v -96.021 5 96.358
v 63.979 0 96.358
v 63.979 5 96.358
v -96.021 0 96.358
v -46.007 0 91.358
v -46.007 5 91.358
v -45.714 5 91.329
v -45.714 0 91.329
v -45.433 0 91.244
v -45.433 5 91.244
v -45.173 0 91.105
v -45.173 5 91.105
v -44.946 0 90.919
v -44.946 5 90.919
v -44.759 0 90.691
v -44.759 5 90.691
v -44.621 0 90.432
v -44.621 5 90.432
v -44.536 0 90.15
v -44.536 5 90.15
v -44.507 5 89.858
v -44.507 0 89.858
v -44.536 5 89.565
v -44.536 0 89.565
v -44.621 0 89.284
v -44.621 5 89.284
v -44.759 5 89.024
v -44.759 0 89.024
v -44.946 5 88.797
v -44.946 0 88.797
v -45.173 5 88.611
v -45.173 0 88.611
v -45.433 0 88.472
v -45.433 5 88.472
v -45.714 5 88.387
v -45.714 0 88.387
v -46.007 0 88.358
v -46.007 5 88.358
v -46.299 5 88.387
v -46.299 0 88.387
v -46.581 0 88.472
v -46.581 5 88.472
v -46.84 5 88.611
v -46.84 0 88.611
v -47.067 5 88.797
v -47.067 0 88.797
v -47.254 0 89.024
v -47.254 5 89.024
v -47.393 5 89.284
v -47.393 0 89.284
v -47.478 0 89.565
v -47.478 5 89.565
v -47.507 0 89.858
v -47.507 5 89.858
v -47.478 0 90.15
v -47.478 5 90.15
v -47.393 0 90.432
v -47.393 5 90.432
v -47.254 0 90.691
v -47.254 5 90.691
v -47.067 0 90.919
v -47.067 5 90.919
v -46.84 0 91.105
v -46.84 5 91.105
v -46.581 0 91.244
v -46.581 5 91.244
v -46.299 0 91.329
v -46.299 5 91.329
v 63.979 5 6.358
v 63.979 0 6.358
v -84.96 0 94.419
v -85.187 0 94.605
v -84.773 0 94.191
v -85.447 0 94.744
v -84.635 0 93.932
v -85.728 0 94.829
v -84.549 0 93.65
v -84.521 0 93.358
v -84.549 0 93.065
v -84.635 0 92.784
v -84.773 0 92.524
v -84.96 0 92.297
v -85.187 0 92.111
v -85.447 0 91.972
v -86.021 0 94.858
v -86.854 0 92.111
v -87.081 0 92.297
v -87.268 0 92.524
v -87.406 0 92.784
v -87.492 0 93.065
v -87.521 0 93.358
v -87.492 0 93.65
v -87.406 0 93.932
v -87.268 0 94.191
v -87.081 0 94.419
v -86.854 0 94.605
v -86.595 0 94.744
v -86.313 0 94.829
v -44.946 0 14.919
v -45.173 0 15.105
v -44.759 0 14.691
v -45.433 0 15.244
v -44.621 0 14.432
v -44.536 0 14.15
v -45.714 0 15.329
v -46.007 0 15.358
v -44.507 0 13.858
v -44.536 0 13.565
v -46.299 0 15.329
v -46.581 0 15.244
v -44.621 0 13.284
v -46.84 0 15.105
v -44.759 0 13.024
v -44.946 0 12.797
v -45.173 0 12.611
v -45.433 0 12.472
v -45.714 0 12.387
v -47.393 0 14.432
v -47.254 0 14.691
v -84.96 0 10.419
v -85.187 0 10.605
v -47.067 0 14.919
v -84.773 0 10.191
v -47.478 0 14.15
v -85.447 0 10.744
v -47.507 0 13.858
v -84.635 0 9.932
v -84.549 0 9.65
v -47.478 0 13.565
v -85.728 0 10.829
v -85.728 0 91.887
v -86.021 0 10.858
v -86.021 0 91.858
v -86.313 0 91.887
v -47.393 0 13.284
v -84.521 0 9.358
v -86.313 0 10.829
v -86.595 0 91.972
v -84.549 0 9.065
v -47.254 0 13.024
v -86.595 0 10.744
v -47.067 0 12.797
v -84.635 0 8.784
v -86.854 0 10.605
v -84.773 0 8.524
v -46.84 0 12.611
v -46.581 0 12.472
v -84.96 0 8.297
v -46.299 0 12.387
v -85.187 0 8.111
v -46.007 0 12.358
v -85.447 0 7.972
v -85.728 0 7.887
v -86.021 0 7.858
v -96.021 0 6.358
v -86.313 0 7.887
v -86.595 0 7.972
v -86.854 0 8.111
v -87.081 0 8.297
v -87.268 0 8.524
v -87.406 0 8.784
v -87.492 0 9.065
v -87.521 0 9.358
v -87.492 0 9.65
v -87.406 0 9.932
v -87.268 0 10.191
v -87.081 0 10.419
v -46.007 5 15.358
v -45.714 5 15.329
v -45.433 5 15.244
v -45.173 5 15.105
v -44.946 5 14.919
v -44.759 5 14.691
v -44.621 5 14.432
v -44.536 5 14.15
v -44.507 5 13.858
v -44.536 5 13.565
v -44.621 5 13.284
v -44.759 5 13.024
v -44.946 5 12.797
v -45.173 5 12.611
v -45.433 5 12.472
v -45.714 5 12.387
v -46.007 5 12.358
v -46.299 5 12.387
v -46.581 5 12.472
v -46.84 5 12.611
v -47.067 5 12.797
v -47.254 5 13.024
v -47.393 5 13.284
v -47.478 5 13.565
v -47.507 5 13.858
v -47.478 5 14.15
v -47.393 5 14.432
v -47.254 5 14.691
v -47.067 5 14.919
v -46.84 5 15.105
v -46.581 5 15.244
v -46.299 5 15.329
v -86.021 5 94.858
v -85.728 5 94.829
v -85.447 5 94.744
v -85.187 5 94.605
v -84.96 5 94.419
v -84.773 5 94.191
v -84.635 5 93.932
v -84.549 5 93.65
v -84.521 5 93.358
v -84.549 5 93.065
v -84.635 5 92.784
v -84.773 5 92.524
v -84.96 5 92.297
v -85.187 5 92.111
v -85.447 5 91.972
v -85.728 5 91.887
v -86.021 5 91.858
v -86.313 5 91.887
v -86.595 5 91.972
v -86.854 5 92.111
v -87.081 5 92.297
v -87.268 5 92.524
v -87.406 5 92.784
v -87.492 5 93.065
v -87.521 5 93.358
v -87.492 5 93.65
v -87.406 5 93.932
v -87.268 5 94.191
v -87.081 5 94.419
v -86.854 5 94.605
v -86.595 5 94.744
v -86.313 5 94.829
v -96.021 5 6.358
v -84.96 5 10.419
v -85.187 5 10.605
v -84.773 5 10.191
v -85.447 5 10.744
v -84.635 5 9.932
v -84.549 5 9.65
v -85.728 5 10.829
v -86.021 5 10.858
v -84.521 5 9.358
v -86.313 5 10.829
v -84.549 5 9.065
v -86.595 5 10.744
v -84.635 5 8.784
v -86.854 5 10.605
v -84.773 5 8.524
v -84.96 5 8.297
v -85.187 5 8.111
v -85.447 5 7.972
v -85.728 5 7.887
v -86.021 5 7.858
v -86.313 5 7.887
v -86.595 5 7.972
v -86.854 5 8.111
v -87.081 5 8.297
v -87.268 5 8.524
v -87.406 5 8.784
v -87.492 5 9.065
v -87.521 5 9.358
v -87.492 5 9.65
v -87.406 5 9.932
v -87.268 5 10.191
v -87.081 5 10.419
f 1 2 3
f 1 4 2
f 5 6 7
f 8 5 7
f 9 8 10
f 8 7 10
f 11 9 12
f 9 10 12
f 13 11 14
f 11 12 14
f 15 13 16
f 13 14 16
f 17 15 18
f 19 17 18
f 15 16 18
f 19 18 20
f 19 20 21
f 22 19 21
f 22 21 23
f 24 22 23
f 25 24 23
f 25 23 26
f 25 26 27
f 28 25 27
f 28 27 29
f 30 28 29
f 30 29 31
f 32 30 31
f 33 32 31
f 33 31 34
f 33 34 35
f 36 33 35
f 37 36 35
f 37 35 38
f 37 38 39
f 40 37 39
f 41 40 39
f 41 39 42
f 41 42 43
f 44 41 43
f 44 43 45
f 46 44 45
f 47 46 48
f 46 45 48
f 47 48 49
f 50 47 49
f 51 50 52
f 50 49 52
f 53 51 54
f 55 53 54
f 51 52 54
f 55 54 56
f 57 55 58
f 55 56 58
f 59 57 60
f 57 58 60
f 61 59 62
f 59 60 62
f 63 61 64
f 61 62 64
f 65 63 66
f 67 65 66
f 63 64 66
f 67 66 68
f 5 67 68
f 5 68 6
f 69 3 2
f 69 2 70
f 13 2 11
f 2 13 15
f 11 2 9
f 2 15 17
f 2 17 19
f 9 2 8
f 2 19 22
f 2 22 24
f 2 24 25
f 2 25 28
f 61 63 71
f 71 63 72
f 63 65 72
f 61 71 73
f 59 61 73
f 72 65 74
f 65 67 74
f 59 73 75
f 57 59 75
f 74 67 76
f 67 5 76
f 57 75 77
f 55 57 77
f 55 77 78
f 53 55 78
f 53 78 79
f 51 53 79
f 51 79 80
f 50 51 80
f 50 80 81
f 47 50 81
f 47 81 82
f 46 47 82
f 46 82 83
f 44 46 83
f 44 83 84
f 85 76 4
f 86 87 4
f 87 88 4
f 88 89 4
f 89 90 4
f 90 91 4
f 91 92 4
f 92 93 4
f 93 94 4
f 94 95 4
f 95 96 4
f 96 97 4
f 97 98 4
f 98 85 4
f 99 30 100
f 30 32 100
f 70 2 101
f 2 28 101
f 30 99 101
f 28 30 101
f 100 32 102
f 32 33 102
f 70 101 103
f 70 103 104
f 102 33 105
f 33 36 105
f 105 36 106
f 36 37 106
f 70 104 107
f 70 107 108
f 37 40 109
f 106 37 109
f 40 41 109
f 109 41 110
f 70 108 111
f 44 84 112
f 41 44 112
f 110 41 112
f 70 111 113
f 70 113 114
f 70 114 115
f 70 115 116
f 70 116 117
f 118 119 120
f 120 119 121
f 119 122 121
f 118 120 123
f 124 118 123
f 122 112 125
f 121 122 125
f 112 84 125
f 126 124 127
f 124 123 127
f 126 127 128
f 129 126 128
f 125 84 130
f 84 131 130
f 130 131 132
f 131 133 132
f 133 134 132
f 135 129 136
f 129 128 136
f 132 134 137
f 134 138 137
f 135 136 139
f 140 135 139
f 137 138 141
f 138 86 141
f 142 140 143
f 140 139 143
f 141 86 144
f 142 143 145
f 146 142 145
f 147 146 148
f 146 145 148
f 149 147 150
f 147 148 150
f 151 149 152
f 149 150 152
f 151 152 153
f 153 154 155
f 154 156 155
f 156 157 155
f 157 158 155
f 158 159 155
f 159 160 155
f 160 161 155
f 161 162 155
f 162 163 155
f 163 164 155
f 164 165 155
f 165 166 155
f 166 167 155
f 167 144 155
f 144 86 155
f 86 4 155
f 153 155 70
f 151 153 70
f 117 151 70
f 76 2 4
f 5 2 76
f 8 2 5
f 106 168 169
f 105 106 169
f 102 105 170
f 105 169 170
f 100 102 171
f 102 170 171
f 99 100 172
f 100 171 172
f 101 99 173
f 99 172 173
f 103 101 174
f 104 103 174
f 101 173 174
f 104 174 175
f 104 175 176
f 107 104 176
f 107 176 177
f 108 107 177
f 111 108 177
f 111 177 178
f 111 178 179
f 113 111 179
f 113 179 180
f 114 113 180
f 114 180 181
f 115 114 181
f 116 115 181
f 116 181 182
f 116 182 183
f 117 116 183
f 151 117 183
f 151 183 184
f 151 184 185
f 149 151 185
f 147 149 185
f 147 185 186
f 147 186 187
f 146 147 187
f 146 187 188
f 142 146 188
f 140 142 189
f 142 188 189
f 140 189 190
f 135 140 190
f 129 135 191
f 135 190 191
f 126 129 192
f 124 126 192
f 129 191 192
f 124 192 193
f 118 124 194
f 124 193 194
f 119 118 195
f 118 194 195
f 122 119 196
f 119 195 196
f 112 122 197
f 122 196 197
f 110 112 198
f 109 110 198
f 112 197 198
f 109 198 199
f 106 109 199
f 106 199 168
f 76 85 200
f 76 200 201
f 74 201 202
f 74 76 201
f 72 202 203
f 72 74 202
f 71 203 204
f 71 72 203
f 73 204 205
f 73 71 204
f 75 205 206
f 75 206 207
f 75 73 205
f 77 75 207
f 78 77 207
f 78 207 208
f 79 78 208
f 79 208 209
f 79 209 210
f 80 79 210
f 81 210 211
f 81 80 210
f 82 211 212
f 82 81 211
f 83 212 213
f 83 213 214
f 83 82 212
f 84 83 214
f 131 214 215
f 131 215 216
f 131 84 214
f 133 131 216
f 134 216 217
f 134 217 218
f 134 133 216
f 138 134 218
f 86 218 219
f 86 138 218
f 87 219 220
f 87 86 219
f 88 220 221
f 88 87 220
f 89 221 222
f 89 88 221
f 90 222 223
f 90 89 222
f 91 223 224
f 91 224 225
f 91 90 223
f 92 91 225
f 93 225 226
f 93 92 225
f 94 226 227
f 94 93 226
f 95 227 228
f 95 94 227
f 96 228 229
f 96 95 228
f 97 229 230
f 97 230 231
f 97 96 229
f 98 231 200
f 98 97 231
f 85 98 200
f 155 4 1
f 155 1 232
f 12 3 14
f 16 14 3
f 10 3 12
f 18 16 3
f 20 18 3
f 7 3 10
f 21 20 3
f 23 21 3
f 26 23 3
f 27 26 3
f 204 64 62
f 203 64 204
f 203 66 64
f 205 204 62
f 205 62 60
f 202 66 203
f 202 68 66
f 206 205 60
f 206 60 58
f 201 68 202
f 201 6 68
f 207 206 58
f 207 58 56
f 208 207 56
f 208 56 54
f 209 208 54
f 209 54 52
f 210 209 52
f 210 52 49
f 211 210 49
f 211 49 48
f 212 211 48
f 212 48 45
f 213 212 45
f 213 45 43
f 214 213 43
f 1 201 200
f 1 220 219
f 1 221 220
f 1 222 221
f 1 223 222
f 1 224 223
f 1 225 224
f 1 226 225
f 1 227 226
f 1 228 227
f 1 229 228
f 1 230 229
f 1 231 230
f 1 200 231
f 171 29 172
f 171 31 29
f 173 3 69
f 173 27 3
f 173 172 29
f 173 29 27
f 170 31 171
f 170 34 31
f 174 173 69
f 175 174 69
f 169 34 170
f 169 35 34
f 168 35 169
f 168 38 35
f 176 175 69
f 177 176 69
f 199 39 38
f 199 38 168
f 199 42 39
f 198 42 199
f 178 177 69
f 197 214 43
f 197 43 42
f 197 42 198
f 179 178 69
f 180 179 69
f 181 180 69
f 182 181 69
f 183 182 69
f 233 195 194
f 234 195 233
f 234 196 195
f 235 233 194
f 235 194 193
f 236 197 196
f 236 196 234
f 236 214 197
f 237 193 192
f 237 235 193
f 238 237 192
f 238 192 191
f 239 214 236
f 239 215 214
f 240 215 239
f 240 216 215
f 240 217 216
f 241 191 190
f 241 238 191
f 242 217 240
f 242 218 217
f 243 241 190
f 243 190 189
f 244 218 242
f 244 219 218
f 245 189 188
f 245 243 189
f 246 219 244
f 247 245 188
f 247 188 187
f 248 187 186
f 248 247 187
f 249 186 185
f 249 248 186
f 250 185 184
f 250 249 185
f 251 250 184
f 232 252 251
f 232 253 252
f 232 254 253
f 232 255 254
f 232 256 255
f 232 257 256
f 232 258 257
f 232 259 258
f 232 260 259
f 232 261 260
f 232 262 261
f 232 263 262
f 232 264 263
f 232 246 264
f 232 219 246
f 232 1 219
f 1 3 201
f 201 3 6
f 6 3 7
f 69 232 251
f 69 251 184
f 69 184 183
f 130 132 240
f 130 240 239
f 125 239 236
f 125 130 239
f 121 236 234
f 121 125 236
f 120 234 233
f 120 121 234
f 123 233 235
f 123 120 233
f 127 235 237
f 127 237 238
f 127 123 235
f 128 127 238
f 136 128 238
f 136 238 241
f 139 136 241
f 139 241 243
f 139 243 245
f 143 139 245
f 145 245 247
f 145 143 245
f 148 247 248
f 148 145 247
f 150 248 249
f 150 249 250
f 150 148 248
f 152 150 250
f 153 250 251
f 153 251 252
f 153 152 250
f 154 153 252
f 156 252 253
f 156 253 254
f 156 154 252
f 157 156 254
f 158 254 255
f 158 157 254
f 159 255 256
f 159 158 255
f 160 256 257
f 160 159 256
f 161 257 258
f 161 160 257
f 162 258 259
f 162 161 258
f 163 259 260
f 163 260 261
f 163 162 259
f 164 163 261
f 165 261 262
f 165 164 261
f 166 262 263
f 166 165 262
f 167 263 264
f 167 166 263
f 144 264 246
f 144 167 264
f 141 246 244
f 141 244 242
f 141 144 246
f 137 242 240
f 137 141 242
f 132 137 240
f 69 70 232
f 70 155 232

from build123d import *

# Parameters (mm, degrees)
SKETCH1_W           = 200
SKETCH1_H           = 90
SKETCH1_R           = 1.5
BOSS_EXTRUDE1_DEPTH = 5
SKETCH2_W           = 140
SKETCH2_H           = 90
CUT_EXTRUDE1_DEPTH  = 142.850408897
SKETCH3_R           = 1.5
CUT_EXTRUDE2_DEPTH  = 137.124210251
SKETCH4_W           = 90
SKETCH4_H           = 5
BOSS_EXTRUDE2_DEPTH = 100


with BuildPart() as part:
    # Sketch1 → Boss-Extrude1 (new body)
    with BuildSketch(Plane(origin=(0, 0, 0), x_dir=(1, 0, 0), z_dir=(0, 1, 0))):
        with Locations((3.97934472, -51.35784543)):
            Rectangle(SKETCH1_W, SKETCH1_H)
        with Locations(Location((-86.02065528, -9.35784543, 0), (0, 0, 270))):
            Circle(SKETCH1_R, mode=Mode.SUBTRACT)
        with Locations(Location((-86.02065528, -93.35784543, 0), (0, 0, 270))):
            Circle(SKETCH1_R, mode=Mode.SUBTRACT)
        with Locations(Location((93.97934472, -9.35784543, 0), (0, 0, 270))):
            Circle(SKETCH1_R, mode=Mode.SUBTRACT)
        with Locations(Location((93.97934472, -93.35784543, 0), (0, 0, 270))):
            Circle(SKETCH1_R, mode=Mode.SUBTRACT)
    extrude(amount=BOSS_EXTRUDE1_DEPTH)

    # Sketch2 → Cut-Extrude1 (cut, through all)
    with BuildSketch(Plane(origin=(0, 5, 0), x_dir=(1, 0, 0), z_dir=(0, 1, 0))):
        with Locations((33.97934472, -51.35784543)):
            Rectangle(SKETCH2_W, SKETCH2_H)
    extrude(amount=-CUT_EXTRUDE1_DEPTH, mode=Mode.SUBTRACT)

    # Sketch3 → Cut-Extrude2 (cut, through all)
    with BuildSketch(Plane(origin=(0, 5, 0), x_dir=(1, 0, 0), z_dir=(0, 1, 0))):
        with Locations(Location((-46.006691674, -13.85784543, 0), (0, 0, 270))):
            Circle(SKETCH3_R)
        with Locations(Location((-46.006691674, -89.85784543, 0), (0, 0, 270))):
            Circle(SKETCH3_R)
    extrude(amount=-CUT_EXTRUDE2_DEPTH, mode=Mode.SUBTRACT)

    # Sketch4 → Boss-Extrude2 (add)
    with BuildSketch(Plane(origin=(-36.02065528, 0, 0), x_dir=(0, 0, -1), z_dir=(1, 0, 0))):
        with Locations((-51.35784543, 2.5)):
            Rectangle(SKETCH4_W, SKETCH4_H)
    extrude(amount=BOSS_EXTRUDE2_DEPTH)


solid = part.part
